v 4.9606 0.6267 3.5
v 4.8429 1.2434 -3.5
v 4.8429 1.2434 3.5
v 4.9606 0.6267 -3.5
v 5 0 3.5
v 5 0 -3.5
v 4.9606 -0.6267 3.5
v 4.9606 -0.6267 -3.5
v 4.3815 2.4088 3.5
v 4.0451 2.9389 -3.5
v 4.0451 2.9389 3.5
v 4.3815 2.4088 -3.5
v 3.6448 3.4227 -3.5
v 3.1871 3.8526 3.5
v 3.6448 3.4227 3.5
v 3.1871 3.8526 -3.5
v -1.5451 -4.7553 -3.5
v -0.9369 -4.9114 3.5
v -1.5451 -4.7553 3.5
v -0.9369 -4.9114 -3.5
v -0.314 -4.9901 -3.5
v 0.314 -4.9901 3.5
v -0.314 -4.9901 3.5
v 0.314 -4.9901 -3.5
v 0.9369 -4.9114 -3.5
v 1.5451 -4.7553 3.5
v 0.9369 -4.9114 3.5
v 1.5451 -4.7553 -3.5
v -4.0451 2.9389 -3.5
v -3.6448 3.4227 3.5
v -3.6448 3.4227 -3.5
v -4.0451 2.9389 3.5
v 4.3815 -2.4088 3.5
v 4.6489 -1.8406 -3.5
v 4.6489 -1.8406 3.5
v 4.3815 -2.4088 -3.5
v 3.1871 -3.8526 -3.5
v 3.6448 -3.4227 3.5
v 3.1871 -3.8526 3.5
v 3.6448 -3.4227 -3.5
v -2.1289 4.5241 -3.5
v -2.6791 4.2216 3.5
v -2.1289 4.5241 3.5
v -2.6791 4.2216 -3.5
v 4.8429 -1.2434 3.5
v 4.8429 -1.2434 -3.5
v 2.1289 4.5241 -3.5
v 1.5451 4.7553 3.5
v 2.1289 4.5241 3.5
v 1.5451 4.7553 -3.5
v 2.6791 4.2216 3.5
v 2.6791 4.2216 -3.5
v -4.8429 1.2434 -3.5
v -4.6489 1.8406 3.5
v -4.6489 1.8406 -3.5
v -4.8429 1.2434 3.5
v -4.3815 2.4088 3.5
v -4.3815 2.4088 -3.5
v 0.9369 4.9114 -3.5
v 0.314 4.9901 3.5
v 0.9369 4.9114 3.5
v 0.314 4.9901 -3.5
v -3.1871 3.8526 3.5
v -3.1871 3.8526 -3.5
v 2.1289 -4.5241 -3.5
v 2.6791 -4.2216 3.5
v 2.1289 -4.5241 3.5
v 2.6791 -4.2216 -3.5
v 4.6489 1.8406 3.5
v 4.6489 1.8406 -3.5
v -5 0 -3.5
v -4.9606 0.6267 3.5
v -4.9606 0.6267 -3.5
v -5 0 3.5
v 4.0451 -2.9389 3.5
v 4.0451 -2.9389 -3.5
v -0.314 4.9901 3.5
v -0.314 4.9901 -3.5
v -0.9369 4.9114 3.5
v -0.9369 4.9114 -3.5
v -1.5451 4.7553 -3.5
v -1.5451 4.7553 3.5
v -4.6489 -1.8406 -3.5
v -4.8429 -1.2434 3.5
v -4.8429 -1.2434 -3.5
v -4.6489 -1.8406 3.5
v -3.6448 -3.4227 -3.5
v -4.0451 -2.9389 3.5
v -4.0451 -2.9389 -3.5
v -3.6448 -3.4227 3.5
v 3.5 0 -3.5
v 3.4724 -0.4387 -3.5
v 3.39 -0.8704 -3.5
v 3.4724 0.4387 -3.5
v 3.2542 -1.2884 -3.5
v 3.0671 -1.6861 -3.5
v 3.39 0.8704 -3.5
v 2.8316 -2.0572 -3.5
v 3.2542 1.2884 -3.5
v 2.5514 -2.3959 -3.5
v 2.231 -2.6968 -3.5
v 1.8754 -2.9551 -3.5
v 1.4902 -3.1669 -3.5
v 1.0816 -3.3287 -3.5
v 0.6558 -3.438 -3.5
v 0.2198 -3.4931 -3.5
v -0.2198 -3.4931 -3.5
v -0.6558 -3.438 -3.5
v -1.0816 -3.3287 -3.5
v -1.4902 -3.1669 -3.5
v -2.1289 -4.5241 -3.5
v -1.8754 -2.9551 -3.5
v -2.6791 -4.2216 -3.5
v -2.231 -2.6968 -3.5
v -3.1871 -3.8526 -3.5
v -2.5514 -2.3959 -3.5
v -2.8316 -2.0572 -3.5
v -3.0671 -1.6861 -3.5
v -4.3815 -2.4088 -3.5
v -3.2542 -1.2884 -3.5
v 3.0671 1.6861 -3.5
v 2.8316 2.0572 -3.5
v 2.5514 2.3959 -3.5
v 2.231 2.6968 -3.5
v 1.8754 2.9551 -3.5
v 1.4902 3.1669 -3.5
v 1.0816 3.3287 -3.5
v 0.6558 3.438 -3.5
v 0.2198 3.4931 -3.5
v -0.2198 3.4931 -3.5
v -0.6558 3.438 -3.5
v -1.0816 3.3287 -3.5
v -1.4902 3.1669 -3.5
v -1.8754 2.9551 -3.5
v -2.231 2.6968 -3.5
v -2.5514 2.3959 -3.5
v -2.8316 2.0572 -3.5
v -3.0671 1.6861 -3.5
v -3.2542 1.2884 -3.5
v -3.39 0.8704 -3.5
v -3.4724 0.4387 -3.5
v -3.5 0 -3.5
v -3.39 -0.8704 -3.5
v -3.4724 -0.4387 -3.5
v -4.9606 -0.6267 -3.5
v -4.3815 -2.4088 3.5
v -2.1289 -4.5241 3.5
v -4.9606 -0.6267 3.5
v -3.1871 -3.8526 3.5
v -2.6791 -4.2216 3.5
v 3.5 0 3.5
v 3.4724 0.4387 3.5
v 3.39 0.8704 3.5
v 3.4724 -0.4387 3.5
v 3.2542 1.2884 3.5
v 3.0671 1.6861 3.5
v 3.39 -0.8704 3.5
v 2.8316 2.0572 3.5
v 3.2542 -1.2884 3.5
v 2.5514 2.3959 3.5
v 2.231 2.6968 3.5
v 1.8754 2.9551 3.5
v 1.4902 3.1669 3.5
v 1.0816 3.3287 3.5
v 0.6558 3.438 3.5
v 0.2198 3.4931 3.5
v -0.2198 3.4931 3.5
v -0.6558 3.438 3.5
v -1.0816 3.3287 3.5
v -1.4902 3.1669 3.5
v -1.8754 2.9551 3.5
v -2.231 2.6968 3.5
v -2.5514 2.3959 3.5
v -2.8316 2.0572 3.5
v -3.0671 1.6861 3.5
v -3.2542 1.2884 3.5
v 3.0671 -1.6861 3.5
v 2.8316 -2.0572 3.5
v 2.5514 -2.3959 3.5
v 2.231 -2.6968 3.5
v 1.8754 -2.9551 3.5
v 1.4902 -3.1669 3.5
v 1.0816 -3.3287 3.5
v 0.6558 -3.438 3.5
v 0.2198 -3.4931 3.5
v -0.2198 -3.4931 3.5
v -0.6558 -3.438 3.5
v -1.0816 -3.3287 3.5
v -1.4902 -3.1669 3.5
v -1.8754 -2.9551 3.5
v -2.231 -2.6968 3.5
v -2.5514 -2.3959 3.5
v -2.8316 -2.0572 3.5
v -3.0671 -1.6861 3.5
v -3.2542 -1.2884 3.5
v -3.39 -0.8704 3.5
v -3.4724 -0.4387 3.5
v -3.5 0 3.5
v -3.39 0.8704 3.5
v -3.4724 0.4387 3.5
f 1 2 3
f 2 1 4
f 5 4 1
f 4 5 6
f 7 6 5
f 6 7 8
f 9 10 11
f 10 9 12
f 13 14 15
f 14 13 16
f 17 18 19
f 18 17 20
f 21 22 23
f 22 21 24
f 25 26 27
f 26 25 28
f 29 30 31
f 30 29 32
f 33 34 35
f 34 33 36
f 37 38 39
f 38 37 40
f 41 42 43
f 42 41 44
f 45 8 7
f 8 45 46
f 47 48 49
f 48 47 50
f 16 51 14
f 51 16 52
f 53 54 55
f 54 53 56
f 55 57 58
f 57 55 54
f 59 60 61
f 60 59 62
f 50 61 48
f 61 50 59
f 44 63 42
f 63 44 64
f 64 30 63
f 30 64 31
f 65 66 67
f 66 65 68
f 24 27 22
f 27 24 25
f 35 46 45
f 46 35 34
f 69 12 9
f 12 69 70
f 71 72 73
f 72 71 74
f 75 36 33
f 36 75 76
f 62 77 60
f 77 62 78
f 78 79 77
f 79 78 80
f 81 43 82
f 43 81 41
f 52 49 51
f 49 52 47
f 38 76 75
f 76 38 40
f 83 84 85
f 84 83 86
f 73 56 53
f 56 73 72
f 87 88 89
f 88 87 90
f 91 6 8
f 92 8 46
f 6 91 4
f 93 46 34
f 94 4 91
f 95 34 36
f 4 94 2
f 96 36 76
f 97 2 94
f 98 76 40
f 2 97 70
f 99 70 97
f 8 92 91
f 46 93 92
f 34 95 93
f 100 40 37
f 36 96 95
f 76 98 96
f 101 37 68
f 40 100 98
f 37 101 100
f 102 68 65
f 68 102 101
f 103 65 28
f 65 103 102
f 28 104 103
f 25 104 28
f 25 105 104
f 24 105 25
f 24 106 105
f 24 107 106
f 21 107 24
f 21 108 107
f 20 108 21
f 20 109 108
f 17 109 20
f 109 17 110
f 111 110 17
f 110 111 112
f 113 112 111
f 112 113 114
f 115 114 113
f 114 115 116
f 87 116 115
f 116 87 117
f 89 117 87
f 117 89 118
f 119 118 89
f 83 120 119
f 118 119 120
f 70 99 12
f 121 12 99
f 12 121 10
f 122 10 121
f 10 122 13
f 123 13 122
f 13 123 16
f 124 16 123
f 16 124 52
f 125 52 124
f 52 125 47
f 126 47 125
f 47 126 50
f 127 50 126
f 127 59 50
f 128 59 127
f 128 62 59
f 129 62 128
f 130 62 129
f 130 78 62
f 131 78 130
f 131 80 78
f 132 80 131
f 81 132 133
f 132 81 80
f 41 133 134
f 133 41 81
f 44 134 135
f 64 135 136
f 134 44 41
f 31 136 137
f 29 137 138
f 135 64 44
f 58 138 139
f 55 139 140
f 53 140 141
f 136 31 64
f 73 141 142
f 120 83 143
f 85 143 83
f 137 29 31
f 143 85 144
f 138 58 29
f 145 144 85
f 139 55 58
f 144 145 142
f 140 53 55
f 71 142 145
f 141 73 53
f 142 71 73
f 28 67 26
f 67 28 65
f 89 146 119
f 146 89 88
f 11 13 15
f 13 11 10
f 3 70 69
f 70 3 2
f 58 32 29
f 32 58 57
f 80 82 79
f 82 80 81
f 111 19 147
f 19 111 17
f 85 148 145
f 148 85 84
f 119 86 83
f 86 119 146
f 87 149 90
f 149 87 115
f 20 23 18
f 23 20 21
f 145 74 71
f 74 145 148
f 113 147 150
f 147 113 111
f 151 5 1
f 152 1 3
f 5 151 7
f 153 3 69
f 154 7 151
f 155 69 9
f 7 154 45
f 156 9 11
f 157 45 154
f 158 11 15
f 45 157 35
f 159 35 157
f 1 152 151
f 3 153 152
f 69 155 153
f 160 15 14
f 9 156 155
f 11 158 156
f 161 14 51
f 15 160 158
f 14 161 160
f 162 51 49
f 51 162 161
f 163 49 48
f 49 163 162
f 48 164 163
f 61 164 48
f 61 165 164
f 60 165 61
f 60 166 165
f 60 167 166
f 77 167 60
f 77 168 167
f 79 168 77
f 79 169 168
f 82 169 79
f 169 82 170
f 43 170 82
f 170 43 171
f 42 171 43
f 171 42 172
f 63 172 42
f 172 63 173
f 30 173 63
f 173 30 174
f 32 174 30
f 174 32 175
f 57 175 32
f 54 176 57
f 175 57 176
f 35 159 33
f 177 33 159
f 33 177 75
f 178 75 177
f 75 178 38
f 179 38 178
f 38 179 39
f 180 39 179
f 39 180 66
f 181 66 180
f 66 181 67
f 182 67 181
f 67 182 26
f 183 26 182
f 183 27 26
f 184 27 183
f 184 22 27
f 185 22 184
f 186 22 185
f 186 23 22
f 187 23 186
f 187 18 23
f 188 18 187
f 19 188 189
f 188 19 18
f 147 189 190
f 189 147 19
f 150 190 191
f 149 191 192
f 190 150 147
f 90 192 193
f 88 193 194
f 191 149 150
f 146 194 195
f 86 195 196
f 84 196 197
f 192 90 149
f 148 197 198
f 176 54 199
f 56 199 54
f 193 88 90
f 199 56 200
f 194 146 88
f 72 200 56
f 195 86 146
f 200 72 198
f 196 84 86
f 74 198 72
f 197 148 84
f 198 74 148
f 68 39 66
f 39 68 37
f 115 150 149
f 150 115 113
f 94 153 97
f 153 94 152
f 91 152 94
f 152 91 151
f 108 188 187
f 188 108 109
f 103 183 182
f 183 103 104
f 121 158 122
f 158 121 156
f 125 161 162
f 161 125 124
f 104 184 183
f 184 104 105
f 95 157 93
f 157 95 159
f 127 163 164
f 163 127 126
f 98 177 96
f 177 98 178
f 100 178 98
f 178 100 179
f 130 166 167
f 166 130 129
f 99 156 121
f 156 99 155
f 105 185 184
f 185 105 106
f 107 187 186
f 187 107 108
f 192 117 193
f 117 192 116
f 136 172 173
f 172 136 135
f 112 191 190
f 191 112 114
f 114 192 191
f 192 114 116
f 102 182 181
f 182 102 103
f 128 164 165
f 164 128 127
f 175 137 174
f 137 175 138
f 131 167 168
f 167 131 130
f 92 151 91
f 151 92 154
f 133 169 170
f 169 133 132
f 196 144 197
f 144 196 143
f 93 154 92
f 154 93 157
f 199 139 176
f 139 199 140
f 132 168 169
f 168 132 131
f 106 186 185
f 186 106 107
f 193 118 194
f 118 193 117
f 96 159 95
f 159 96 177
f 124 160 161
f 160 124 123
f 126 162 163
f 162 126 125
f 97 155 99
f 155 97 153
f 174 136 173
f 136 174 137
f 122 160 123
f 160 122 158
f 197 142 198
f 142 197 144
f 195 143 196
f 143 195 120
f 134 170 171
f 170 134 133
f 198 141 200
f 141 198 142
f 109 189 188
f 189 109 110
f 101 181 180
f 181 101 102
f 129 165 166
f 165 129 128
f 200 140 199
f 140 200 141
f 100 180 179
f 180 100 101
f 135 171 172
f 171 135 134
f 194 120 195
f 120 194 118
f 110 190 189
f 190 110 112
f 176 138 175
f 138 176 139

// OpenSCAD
$fn = 50;


difference() {
	union() {
		translate(v = [0, 0, -3.5000000000]) {
			cylinder(h = 7, r = 5.0000000000);
		}
	}
	union() {
		translate(v = [0, 0, -100.0000000000]) {
			cylinder(h = 200, r = 3.5000000000);
		}
	}
}
